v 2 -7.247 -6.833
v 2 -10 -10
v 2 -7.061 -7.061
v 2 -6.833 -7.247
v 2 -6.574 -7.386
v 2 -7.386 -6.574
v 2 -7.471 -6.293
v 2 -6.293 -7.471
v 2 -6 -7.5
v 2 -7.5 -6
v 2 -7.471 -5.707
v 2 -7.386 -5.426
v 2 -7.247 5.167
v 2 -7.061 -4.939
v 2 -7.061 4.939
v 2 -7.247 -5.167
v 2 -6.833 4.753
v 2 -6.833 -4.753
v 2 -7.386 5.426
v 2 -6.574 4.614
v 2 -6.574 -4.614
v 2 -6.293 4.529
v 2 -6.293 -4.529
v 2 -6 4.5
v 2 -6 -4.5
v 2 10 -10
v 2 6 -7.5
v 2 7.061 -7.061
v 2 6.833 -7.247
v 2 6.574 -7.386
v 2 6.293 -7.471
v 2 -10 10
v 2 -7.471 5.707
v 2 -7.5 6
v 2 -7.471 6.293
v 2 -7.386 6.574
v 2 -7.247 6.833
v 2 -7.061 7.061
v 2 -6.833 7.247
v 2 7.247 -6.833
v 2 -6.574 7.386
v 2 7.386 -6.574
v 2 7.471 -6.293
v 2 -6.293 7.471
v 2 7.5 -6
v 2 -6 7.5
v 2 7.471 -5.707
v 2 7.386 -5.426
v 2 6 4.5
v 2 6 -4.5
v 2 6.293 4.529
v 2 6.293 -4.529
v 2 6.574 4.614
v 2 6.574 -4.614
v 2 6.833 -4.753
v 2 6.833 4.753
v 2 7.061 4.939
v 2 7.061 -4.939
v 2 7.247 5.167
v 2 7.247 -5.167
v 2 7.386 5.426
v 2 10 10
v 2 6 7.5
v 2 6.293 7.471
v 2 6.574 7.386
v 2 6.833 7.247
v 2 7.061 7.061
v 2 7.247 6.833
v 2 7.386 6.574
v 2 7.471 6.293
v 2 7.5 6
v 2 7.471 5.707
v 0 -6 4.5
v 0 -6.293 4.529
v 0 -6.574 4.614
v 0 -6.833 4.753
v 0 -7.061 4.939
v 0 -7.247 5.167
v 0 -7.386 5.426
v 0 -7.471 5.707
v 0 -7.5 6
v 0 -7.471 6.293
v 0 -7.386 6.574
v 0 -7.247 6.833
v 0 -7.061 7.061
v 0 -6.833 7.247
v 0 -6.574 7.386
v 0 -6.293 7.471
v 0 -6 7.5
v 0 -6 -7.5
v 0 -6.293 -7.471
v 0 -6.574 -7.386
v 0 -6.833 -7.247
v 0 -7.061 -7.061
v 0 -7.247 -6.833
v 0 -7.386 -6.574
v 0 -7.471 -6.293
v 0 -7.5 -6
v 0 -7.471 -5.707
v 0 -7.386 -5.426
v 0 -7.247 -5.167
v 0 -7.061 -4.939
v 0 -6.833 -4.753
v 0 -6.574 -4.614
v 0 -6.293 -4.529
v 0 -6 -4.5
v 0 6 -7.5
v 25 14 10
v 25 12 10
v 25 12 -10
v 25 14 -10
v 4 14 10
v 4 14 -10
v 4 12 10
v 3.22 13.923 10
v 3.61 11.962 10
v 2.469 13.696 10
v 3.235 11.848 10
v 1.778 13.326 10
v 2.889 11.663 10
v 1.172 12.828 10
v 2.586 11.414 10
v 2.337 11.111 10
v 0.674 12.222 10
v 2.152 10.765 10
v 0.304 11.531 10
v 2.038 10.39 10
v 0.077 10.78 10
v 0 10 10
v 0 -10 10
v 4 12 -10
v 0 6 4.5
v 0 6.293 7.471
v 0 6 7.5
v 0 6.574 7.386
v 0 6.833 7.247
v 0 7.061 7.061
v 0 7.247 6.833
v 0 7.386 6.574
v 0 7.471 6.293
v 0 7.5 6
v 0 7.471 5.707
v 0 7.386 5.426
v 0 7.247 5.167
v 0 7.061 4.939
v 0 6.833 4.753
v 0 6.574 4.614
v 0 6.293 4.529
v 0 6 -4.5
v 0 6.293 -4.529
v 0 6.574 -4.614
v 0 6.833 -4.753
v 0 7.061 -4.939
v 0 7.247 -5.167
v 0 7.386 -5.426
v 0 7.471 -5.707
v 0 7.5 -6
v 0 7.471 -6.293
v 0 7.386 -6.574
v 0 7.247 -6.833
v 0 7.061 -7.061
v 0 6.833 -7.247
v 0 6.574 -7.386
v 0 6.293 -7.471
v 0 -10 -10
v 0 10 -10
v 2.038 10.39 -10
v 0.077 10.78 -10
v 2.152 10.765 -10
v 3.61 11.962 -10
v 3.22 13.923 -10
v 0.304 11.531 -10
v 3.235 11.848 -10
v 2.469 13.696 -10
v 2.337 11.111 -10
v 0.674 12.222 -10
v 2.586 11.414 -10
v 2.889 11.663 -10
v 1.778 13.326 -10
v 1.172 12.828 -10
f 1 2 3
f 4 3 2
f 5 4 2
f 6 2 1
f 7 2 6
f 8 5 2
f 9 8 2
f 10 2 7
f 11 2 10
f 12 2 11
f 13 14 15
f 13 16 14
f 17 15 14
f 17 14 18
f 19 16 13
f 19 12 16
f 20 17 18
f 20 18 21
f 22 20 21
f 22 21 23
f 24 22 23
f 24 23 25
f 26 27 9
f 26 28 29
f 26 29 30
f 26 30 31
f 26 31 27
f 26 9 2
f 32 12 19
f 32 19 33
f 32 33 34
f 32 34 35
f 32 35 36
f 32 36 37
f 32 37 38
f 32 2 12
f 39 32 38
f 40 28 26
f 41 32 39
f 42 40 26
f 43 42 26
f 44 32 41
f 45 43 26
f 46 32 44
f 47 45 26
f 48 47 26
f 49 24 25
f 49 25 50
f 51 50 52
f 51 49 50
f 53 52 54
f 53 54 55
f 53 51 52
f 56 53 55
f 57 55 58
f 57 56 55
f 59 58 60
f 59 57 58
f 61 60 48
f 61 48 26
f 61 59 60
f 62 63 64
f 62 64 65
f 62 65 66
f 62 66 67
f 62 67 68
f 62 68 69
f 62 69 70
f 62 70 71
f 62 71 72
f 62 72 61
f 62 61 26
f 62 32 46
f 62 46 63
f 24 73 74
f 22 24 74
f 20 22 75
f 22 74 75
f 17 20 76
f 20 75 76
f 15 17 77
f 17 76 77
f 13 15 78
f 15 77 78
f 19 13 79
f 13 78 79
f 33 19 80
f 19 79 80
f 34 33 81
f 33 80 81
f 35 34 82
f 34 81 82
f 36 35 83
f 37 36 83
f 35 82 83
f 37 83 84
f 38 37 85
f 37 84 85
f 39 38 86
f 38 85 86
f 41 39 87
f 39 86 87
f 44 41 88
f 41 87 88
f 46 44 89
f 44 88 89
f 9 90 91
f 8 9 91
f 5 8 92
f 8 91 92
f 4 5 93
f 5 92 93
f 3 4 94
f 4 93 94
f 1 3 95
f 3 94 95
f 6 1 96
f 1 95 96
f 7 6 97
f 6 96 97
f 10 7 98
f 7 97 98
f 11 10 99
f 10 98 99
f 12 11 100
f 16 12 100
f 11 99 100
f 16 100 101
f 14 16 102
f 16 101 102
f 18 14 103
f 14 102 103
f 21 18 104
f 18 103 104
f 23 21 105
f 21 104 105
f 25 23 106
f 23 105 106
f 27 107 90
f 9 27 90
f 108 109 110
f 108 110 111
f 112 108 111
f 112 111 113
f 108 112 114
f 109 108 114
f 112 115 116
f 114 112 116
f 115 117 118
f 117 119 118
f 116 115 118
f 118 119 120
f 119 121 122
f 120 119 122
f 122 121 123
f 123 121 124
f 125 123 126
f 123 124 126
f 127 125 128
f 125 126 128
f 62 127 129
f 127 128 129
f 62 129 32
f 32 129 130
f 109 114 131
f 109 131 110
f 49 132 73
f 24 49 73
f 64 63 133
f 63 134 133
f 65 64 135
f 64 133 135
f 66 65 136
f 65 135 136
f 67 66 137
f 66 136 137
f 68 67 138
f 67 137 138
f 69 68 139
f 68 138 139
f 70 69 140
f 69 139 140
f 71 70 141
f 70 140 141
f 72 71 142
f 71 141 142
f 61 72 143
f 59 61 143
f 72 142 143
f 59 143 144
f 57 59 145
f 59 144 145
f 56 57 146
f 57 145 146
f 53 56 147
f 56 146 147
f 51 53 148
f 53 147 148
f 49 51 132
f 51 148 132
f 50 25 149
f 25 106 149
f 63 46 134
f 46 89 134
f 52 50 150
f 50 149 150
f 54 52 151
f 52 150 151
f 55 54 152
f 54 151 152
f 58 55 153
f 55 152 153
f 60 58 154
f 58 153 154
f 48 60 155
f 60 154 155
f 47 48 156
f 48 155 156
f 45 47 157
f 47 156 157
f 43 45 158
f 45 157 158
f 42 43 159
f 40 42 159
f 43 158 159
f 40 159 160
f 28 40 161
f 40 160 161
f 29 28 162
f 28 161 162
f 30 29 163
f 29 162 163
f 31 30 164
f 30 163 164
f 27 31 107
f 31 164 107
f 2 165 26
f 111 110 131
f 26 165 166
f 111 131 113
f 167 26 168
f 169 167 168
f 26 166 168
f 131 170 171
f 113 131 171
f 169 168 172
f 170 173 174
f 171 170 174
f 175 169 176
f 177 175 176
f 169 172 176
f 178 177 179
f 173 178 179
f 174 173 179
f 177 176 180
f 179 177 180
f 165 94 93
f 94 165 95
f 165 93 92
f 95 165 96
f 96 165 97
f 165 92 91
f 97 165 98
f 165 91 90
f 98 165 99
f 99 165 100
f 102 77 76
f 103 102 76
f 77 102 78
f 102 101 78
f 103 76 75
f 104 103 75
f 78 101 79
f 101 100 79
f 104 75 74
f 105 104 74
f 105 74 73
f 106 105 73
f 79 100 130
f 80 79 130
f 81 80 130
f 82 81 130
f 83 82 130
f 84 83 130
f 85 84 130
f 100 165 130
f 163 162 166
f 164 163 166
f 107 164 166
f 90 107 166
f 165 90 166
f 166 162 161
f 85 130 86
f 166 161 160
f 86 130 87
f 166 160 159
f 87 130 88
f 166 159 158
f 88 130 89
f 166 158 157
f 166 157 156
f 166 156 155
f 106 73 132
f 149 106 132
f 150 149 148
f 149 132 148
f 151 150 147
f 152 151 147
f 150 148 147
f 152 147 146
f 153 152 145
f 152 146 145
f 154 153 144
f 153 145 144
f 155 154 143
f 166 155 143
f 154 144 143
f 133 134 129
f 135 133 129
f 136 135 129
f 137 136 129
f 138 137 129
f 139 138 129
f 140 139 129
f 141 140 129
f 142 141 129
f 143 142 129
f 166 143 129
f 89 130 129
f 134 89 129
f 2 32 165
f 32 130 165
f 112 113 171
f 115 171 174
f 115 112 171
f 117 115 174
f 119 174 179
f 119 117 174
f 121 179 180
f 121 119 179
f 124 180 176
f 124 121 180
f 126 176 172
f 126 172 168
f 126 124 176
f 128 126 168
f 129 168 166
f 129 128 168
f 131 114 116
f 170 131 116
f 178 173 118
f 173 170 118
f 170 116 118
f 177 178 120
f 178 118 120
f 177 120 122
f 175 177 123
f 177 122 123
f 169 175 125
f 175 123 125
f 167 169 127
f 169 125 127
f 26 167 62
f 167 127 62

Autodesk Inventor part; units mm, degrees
ref_plane "YZ Plane" through (0, 0, 0) normal (1, 0, 0) x (0, 1, 0)
ref_plane "XZ Plane" through (0, 0, 0) normal (0, 1, 0) x (-1, 0, 0)
ref_plane "XY Plane" through (0, 0, 0) normal (0, 0, 1) x (1, 0, 0)
sketch "スケッチ1" plane through (0, 0, 0) normal (1, 0, 0) x (0, 1, 0)
  line L0 (-10, -10) -> (10, -10)
  line L1 (10, -10) -> (10, 10)
  line L2 (10, 10) -> (-10, 10)
  line L3 (-10, 10) -> (-10, -10)
  line L4 (-10, -10) -> (10, 10) construction
  line L5 (10, -10) -> (-10, 10) construction
  point P0 (0, 0)
  dimension "d0" = 20
  dimension "d1" = 20
extrude "プレート1" add sketch "スケッチ1" along normal blind 2
sketch "スケッチ2" plane through (4, 12, 10) normal (0, 1, 0) x (-1, 0, 0)
  line L0 (0, -20) -> (0, 0)
  line L1 (0, 0) -> (-21, 0)
  line L2 (-21, 0) -> (-21, -20)
  line L3 (-21, -20) -> (0, -20)
edge flange "フランジ1" height 25 angle 90 thickness 2 bend radius 2 thickness toward (0, 1, 0) relief straight relief width 2 relief depth 1 edges at (2, 10, 0) wall of the first edge with corners at (4, 12, -10) (4, 12, 10) (25, 12, 10) (25, 12, -10)
bend "曲げ1"
corner "コーナー1"
sketch "スケッチ3" plane through (0, 0, 0) normal (-1, 0, 0) x (0, 0, 1)
  line L0 (-7.5, 6) -> (-7.5, -6)
  arc A0 (-7.5, -6) -> (-4.5, -6) centre (-6, -6) ccw
  line L1 (-4.5, -6) -> (-4.5, 6)
  arc A1 (-4.5, 6) -> (-7.5, 6) centre (-6, 6) ccw
  line L2 (4.5, 6) -> (4.5, -6)
  arc A2 (4.5, -6) -> (7.5, -6) centre (6, -6) ccw
  line L3 (7.5, -6) -> (7.5, 6)
  arc A3 (7.5, 6) -> (4.5, 6) centre (6, 6) ccw
  line L4 (-10, -10) -> (-10, 10) projected
  line L5 (10, 10) -> (10, -10) projected
  line L6 (10, -10) -> (-10, -10) projected
  line L7 (-10, 10) -> (10, 10) projected
  point P0 (0, 0)
  dimension "d13" = 4
  dimension "d14" = 4
  dimension "d15" = 1.5
  dimension "d16" = 1.5
  dimension "d17" = 4
  dimension "d18" = 4
  dimension "d19" = 4
  dimension "d20" = 4
extrude "押し出し1" cut sketch "スケッチ3" against normal blind 10 contours A1 L1 A0 L0 | A3 L3 A2 L2
equation "\"d2\" = Thickness"
equation "\"d3\" = BendReliefWidth"
equation "\"d4\" = BendReliefDepth"
equation "\"d5\" = MinimumRemnant"
equation "\"d6\" = TransitionRadius"
equation "\"d9\" = BendRadius"
equation "\"d10\" = CornerReliefSize"
equation "\"d11\" = GapSize"
equation "\"d12\" = JacobiRadiusSize"
equation "\"BendRadius\" = Thickness"
equation "\"BendReliefWidth\" = Thickness"
equation "\"BendReliefDepth\" = 0.5 * Thickness"
equation "\"CornerReliefSize\" = 4 * Thickness"
equation "\"MinimumRemnant\" = 2 * Thickness"
equation "\"TransitionRadius\" = BendRadius"
equation "\"JacobiRadiusSize\" = Thickness"
equation "\"GapSize\" = Thickness"
equation "\"Thickness\" = 2"
properties part number "trackballL"
